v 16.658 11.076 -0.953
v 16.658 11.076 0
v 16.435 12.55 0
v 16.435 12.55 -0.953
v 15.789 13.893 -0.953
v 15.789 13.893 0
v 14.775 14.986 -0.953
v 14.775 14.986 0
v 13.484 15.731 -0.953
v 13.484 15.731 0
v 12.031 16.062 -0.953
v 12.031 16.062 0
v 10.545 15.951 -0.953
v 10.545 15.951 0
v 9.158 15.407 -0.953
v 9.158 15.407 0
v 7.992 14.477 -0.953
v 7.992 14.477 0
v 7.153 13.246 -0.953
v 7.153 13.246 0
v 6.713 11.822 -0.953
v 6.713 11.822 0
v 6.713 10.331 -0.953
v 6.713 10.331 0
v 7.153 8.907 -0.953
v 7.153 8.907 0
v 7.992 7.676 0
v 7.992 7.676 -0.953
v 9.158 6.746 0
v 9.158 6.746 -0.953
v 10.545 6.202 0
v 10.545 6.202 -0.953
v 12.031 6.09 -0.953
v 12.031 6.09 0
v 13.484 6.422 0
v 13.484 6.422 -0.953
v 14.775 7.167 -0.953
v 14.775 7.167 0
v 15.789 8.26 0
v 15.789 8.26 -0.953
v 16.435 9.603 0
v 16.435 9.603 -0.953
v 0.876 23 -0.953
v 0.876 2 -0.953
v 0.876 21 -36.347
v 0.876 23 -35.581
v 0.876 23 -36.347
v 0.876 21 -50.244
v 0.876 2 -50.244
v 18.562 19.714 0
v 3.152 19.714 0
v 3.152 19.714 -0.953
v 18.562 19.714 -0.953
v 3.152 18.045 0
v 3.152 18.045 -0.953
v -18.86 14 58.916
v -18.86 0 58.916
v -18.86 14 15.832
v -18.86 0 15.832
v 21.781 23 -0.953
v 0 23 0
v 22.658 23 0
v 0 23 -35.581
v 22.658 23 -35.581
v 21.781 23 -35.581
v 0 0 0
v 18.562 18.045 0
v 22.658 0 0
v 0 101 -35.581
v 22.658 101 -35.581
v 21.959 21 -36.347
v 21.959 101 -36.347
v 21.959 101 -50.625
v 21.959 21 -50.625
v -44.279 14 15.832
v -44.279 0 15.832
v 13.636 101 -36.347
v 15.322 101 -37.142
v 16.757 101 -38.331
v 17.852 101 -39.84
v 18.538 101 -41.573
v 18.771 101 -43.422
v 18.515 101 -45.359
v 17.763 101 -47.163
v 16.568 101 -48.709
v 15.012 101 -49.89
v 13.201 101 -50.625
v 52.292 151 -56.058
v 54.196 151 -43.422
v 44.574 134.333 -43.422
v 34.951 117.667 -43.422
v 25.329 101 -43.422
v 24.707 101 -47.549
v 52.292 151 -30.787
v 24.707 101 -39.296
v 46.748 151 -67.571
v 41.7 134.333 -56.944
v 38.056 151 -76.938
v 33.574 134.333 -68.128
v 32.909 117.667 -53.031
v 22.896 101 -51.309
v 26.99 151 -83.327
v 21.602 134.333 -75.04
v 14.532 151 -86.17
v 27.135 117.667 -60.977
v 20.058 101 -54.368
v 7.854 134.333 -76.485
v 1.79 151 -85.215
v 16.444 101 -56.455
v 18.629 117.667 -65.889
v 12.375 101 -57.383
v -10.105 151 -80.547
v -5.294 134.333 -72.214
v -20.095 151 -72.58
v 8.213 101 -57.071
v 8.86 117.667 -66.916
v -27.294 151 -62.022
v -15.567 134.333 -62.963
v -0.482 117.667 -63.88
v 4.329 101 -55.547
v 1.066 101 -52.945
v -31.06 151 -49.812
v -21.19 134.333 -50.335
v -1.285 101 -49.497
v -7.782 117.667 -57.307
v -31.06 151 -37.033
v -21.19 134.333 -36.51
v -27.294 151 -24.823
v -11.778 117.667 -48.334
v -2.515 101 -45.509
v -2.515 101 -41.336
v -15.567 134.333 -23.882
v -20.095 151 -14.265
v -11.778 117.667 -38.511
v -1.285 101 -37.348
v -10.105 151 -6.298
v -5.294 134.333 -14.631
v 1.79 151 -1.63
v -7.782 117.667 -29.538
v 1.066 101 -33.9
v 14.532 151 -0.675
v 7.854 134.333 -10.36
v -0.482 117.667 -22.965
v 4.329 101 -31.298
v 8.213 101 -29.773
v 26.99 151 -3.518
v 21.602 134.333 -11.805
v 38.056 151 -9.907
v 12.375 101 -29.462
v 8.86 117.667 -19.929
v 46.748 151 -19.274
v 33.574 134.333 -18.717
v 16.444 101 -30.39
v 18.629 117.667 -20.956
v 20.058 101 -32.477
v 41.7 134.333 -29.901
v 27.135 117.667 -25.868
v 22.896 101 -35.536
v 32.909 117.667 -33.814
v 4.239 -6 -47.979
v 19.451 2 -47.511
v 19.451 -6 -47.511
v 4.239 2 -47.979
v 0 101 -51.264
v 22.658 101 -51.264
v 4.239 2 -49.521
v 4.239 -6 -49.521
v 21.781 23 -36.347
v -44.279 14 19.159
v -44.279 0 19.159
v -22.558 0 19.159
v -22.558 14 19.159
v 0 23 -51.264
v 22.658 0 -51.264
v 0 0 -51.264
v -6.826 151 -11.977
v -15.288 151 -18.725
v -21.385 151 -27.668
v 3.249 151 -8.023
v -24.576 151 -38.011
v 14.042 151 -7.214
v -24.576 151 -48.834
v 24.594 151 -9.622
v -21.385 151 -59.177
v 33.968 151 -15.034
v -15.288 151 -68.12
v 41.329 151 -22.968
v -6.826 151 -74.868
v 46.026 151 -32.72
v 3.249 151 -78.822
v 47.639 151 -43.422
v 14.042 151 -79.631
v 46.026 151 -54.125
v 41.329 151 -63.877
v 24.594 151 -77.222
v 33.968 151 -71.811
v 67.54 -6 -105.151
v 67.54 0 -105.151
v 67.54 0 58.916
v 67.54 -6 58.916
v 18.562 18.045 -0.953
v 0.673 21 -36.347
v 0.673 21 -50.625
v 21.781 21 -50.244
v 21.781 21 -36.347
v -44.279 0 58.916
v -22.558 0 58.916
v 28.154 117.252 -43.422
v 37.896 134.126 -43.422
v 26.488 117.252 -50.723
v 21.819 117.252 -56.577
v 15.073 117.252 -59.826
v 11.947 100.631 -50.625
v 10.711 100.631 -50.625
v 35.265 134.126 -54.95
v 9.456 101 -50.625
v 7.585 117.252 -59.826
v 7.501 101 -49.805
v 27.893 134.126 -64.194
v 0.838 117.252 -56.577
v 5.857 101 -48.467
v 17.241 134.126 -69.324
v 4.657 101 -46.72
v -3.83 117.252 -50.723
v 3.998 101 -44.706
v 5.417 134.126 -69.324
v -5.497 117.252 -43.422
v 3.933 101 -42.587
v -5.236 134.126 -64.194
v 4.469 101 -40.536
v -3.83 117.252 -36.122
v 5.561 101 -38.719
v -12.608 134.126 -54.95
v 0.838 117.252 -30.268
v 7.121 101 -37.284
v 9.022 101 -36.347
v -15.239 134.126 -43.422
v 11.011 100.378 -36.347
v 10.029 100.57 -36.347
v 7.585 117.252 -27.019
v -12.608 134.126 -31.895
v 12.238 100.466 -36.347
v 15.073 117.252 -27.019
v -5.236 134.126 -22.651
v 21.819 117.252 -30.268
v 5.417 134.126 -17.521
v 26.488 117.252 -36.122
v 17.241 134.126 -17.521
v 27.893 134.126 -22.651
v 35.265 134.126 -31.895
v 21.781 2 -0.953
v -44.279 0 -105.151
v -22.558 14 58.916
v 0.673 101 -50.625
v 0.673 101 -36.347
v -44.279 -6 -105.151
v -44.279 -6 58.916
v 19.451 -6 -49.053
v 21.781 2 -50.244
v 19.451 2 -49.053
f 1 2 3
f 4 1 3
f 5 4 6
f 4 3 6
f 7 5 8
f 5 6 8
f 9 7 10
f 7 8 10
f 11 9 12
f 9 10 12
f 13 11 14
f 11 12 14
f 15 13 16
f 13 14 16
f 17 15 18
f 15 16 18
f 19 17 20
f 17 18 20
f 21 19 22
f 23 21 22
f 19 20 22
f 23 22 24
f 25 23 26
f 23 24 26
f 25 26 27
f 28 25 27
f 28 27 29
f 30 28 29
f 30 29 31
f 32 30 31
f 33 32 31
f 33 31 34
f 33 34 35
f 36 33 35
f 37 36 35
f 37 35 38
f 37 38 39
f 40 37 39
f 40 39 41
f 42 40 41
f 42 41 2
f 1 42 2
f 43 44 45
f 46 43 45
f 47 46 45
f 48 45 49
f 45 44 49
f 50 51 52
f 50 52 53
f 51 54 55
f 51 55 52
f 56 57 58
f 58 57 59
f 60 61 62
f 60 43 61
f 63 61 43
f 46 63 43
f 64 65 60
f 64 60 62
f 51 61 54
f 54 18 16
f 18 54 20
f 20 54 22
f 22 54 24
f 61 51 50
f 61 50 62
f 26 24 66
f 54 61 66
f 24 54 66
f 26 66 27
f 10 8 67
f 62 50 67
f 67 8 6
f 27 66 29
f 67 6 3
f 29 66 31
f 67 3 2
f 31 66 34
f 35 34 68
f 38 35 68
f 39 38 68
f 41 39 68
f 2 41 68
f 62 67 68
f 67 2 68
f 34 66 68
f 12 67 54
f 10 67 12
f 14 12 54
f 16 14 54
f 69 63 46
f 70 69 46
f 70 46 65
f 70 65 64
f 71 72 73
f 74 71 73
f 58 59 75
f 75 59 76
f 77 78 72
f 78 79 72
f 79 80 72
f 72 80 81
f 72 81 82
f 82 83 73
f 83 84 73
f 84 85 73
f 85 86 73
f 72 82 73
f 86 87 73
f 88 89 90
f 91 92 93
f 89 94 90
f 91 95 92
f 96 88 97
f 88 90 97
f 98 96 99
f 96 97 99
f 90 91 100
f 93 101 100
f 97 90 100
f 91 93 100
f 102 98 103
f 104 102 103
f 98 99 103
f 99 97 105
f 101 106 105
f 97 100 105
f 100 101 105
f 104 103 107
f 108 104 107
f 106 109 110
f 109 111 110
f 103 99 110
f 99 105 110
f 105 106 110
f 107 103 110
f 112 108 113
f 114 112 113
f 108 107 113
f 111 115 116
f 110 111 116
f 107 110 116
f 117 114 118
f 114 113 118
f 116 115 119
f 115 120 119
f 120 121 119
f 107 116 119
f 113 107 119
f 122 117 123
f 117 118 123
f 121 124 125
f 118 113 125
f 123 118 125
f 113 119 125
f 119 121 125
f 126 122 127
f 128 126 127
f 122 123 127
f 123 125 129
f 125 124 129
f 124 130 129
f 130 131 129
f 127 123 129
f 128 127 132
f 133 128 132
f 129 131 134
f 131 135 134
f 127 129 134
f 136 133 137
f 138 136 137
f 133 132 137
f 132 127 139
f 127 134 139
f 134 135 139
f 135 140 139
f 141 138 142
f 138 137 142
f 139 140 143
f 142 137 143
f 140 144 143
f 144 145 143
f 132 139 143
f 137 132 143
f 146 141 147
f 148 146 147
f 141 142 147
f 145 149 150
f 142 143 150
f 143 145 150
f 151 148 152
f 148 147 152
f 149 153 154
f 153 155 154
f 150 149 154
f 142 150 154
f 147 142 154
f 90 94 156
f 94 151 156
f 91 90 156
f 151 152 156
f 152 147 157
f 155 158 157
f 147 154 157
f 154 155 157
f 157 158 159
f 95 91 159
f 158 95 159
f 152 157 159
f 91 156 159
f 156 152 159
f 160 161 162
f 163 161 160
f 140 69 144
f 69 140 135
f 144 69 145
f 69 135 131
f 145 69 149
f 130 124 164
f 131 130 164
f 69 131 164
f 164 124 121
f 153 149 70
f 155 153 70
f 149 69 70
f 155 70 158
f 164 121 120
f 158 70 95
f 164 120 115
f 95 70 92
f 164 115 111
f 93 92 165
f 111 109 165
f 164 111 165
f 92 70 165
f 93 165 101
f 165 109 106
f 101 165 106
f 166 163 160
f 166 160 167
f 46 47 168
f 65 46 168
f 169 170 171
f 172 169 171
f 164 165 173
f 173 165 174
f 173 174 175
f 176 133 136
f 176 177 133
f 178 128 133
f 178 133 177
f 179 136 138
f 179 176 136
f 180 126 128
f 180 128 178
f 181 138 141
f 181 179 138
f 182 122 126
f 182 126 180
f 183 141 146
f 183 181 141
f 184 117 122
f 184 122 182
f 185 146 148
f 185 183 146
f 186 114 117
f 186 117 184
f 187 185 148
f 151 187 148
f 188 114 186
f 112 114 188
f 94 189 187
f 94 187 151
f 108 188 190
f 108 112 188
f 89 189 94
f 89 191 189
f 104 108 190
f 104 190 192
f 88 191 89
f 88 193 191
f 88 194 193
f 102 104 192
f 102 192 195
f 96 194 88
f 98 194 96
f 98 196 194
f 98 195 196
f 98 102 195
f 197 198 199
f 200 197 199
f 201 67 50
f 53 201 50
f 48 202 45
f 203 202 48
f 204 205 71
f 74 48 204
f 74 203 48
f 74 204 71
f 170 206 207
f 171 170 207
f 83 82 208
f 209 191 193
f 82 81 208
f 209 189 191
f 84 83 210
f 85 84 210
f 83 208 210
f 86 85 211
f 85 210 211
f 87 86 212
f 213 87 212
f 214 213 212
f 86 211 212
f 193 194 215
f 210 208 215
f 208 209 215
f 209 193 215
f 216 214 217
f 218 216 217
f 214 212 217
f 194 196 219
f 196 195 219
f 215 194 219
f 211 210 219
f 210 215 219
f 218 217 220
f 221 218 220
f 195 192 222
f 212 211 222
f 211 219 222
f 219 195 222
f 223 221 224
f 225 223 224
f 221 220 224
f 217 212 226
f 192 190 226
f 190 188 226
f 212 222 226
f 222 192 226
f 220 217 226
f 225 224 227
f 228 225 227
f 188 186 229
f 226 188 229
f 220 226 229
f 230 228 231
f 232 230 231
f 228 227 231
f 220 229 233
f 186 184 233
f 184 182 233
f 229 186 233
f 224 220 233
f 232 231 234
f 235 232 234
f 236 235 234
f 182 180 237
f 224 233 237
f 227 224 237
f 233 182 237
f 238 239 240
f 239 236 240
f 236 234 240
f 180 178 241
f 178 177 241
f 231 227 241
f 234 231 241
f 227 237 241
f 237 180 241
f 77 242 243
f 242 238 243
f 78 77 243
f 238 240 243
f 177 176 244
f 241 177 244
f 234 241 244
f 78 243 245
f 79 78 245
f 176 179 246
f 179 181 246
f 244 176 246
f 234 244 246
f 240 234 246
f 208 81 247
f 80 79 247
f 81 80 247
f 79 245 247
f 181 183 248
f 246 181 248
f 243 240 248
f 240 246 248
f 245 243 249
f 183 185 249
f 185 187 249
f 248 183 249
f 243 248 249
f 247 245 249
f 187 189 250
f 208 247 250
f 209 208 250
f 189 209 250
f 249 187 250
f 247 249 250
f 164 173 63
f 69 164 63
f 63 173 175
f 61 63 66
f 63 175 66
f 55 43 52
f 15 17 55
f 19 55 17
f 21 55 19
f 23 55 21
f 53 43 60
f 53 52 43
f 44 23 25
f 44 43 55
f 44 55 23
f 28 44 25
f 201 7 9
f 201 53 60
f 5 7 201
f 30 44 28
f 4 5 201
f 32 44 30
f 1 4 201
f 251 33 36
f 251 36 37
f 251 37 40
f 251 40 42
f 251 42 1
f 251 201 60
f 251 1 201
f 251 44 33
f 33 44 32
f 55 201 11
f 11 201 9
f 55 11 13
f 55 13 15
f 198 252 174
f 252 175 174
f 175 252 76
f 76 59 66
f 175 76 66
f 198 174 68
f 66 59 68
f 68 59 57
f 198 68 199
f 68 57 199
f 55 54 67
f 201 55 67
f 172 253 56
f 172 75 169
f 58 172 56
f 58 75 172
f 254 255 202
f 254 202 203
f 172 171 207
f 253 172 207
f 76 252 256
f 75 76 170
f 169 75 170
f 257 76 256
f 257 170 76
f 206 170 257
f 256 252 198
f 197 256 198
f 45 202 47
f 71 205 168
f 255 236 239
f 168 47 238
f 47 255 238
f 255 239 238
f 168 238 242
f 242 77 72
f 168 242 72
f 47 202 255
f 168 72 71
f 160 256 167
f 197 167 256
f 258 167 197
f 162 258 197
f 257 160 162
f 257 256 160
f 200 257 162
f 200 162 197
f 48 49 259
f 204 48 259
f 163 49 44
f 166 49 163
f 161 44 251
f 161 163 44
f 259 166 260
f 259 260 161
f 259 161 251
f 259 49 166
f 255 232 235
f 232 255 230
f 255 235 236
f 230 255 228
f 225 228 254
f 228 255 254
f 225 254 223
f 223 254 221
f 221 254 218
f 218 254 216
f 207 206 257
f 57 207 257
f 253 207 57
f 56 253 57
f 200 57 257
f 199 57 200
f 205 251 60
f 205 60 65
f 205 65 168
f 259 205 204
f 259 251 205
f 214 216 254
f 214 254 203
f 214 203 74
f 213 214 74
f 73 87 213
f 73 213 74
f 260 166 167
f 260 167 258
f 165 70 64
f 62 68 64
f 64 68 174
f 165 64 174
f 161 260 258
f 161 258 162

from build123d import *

# Parameters (mm, degrees)
SKETCH2_W            = 22.657552765
SKETCH2_H            = 51.264295363
BOSS_EXTRUDE1_DEPTH  = 2
SKETCH3_W            = 22.657552765
SKETCH3_H            = 51.264295363
SKETCH3_W_2          = 20.905191144
SKETCH3_H_2          = 49.290834071
BOSS_EXTRUDE2_DEPTH  = 21
BOSS_EXTRUDE3_DEPTH  = 78
SKETCH6_W            = 21.285297843
SKETCH6_H            = 14.278933142
CUT_EXTRUDE1_DEPTH   = 80
SKETCH11_R           = 14
BOSS_EXTRUDE4_DEPTH  = 50
BOSS_EXTRUDE4_DRAFT  = -30
SKETCH12_R           = 36.30995568
CUT_EXTRUDE2_DEPTH   = 51
CUT_EXTRUDE2_DRAFT   = -30
SKETCH14_R           = 5
CUT_EXTRUDE4_DEPTH   = 22
SKETCH15_W           = 15.409943134
SKETCH15_H           = 1.668824362
CUT_EXTRUDE5_DEPTH   = 22
SKETCH16_W           = 111.818738814
SKETCH16_H           = 164.067511329
BOSS_EXTRUDE10_DEPTH = 6
BOSS_EXTRUDE11_DEPTH = 14
CUT_EXTRUDE6_DEPTH   = 14


with BuildPart() as part:
    # Sketch2 → Boss-Extrude1 (new body)
    with BuildSketch(Plane(origin=(0, 0, 0), x_dir=(1, 0, 0), z_dir=(0, 1, 0))):
        with Locations((11.328776383, 25.632147682)):
            Rectangle(SKETCH2_W, SKETCH2_H)
    extrude(amount=BOSS_EXTRUDE1_DEPTH)

    # Sketch3 → Boss-Extrude2 (add)
    with BuildSketch(Plane(origin=(0, 2, 0), x_dir=(1, 0, 0), z_dir=(0, 1, 0))):
        with Locations((11.328776383, 25.632147682)):
            Rectangle(SKETCH3_W, SKETCH3_H)
        with Locations((11.328776383, 25.598752808)):
            Rectangle(SKETCH3_W_2, SKETCH3_H_2, mode=Mode.SUBTRACT)
    extrude(amount=BOSS_EXTRUDE2_DEPTH)

    # Sketch5 → Boss-Extrude3 (add)
    with BuildSketch(Plane(origin=(0, 23, 0), x_dir=(1, 0, 0), z_dir=(0, 1, 0))):
        Polygon((22.657552765, 37.450286435), (22.657552765, 51.264295363), (0, 51.264295363), (0, 35.580664168), (22.657552765, 35.580664168), align=None)
    extrude(amount=BOSS_EXTRUDE3_DEPTH)

    # Sketch6 → Cut-Extrude1 (cut)
    with BuildSketch(Plane(origin=(0, 101, 0), x_dir=(1, 0, 0), z_dir=(0, 1, 0))):
        with Locations((11.316093437, 43.486003654)):
            Rectangle(SKETCH6_W, SKETCH6_H)
    extrude(amount=-CUT_EXTRUDE1_DEPTH, mode=Mode.SUBTRACT)


with BuildPart() as boss_extrude4_tool:
    # Sketch11 → Boss-Extrude4 (with draft: the straight prism first)
    with BuildSketch(Plane(origin=(0, 101, 0), x_dir=(1, 0, 0), z_dir=(0, 1, 0))):
        with Locations((11.328776383, 43.422479766)):
            Circle(SKETCH11_R)
    extrude(amount=BOSS_EXTRUDE4_DEPTH)
    # Boss-Extrude4: the draft: its side faces are tilted about the plane it starts from
    boss_extrude4_sides = [boss_extrude4_tool.faces().sort_by_distance(p)[0] for p in [
        (-2.671223617, 126, -43.422479766),
    ]]
    draft(boss_extrude4_sides, Plane(origin=(0, 101, 0), x_dir=(1, 0, 0), z_dir=(0, 1, 0)), BOSS_EXTRUDE4_DRAFT)


with BuildPart() as part_1:
    add(part.part)

    # Boss-Extrude4: add boss_extrude4_tool
    add(boss_extrude4_tool.part)


with BuildPart() as cut_extrude2_tool:
    # Sketch12 → Cut-Extrude2 (with draft: the straight prism first)
    with BuildSketch(Plane(origin=(0, 151, 0), x_dir=(1, 0, 0), z_dir=(0, 1, 0))):
        with Locations((11.328776383, 43.422479766)):
            Circle(SKETCH12_R)
    extrude(amount=-CUT_EXTRUDE2_DEPTH)
    # Cut-Extrude2: the draft: its side faces are tilted about the plane it starts from
    cut_extrude2_sides = [cut_extrude2_tool.faces().sort_by_distance(p)[0] for p in [
        (-24.981179297, 125.5, -43.422479766),
    ]]
    draft(cut_extrude2_sides, Plane(origin=(0, 151, 0), x_dir=(1, 0, 0), z_dir=(0, 1, 0)), CUT_EXTRUDE2_DRAFT)


with BuildPart() as part_2:
    add(part_1.part)

    # Cut-Extrude2: cut by cut_extrude2_tool
    add(cut_extrude2_tool.part, mode=Mode.SUBTRACT)

    # Sketch14 → Cut-Extrude4 (cut)
    with BuildSketch(Plane.XY):
        with Locations((11.657552765, 11.076385635)):
            Circle(SKETCH14_R)
    extrude(amount=-CUT_EXTRUDE4_DEPTH, mode=Mode.SUBTRACT)

    # Sketch15 → Cut-Extrude5 (cut)
    with BuildSketch(Plane.XY):
        with Locations((10.856611193, 18.879859243)):
            Rectangle(SKETCH15_W, SKETCH15_H)
    extrude(amount=-CUT_EXTRUDE5_DEPTH, mode=Mode.SUBTRACT)

    # Sketch16 → Boss-Extrude10 (add)
    with BuildSketch(Plane.XZ):
        with Locations((11.63043448, -23.117453155)):
            Rectangle(SKETCH16_W, SKETCH16_H)
    extrude(amount=BOSS_EXTRUDE10_DEPTH)

    # Sketch17 → Boss-Extrude11 (add)
    with BuildSketch(Plane(origin=(0, 0, 0), x_dir=(1, 0, 0), z_dir=(0, 1, 0))):
        Polygon((-44.278934927, -19.158930428), (-22.558261241, -19.158930428), (-22.558261241, -58.91630251), (-18.859616668, -58.91630251), (-18.859616668, -15.83203433), (-44.278934927, -15.83203433), align=None)
    extrude(amount=BOSS_EXTRUDE11_DEPTH)

    # Sketch18 → Cut-Extrude6 (cut)
    with BuildSketch(Plane(origin=(0, 2, 0), x_dir=(1, 0, 0), z_dir=(0, 1, 0))):
        Polygon((4.238517858, 49.520767008), (19.451065942, 49.052935497), (19.451065942, 47.510847256), (4.238517858, 47.978678766), align=None)
    extrude(amount=-CUT_EXTRUDE6_DEPTH, mode=Mode.SUBTRACT)


solid = part_2.part
